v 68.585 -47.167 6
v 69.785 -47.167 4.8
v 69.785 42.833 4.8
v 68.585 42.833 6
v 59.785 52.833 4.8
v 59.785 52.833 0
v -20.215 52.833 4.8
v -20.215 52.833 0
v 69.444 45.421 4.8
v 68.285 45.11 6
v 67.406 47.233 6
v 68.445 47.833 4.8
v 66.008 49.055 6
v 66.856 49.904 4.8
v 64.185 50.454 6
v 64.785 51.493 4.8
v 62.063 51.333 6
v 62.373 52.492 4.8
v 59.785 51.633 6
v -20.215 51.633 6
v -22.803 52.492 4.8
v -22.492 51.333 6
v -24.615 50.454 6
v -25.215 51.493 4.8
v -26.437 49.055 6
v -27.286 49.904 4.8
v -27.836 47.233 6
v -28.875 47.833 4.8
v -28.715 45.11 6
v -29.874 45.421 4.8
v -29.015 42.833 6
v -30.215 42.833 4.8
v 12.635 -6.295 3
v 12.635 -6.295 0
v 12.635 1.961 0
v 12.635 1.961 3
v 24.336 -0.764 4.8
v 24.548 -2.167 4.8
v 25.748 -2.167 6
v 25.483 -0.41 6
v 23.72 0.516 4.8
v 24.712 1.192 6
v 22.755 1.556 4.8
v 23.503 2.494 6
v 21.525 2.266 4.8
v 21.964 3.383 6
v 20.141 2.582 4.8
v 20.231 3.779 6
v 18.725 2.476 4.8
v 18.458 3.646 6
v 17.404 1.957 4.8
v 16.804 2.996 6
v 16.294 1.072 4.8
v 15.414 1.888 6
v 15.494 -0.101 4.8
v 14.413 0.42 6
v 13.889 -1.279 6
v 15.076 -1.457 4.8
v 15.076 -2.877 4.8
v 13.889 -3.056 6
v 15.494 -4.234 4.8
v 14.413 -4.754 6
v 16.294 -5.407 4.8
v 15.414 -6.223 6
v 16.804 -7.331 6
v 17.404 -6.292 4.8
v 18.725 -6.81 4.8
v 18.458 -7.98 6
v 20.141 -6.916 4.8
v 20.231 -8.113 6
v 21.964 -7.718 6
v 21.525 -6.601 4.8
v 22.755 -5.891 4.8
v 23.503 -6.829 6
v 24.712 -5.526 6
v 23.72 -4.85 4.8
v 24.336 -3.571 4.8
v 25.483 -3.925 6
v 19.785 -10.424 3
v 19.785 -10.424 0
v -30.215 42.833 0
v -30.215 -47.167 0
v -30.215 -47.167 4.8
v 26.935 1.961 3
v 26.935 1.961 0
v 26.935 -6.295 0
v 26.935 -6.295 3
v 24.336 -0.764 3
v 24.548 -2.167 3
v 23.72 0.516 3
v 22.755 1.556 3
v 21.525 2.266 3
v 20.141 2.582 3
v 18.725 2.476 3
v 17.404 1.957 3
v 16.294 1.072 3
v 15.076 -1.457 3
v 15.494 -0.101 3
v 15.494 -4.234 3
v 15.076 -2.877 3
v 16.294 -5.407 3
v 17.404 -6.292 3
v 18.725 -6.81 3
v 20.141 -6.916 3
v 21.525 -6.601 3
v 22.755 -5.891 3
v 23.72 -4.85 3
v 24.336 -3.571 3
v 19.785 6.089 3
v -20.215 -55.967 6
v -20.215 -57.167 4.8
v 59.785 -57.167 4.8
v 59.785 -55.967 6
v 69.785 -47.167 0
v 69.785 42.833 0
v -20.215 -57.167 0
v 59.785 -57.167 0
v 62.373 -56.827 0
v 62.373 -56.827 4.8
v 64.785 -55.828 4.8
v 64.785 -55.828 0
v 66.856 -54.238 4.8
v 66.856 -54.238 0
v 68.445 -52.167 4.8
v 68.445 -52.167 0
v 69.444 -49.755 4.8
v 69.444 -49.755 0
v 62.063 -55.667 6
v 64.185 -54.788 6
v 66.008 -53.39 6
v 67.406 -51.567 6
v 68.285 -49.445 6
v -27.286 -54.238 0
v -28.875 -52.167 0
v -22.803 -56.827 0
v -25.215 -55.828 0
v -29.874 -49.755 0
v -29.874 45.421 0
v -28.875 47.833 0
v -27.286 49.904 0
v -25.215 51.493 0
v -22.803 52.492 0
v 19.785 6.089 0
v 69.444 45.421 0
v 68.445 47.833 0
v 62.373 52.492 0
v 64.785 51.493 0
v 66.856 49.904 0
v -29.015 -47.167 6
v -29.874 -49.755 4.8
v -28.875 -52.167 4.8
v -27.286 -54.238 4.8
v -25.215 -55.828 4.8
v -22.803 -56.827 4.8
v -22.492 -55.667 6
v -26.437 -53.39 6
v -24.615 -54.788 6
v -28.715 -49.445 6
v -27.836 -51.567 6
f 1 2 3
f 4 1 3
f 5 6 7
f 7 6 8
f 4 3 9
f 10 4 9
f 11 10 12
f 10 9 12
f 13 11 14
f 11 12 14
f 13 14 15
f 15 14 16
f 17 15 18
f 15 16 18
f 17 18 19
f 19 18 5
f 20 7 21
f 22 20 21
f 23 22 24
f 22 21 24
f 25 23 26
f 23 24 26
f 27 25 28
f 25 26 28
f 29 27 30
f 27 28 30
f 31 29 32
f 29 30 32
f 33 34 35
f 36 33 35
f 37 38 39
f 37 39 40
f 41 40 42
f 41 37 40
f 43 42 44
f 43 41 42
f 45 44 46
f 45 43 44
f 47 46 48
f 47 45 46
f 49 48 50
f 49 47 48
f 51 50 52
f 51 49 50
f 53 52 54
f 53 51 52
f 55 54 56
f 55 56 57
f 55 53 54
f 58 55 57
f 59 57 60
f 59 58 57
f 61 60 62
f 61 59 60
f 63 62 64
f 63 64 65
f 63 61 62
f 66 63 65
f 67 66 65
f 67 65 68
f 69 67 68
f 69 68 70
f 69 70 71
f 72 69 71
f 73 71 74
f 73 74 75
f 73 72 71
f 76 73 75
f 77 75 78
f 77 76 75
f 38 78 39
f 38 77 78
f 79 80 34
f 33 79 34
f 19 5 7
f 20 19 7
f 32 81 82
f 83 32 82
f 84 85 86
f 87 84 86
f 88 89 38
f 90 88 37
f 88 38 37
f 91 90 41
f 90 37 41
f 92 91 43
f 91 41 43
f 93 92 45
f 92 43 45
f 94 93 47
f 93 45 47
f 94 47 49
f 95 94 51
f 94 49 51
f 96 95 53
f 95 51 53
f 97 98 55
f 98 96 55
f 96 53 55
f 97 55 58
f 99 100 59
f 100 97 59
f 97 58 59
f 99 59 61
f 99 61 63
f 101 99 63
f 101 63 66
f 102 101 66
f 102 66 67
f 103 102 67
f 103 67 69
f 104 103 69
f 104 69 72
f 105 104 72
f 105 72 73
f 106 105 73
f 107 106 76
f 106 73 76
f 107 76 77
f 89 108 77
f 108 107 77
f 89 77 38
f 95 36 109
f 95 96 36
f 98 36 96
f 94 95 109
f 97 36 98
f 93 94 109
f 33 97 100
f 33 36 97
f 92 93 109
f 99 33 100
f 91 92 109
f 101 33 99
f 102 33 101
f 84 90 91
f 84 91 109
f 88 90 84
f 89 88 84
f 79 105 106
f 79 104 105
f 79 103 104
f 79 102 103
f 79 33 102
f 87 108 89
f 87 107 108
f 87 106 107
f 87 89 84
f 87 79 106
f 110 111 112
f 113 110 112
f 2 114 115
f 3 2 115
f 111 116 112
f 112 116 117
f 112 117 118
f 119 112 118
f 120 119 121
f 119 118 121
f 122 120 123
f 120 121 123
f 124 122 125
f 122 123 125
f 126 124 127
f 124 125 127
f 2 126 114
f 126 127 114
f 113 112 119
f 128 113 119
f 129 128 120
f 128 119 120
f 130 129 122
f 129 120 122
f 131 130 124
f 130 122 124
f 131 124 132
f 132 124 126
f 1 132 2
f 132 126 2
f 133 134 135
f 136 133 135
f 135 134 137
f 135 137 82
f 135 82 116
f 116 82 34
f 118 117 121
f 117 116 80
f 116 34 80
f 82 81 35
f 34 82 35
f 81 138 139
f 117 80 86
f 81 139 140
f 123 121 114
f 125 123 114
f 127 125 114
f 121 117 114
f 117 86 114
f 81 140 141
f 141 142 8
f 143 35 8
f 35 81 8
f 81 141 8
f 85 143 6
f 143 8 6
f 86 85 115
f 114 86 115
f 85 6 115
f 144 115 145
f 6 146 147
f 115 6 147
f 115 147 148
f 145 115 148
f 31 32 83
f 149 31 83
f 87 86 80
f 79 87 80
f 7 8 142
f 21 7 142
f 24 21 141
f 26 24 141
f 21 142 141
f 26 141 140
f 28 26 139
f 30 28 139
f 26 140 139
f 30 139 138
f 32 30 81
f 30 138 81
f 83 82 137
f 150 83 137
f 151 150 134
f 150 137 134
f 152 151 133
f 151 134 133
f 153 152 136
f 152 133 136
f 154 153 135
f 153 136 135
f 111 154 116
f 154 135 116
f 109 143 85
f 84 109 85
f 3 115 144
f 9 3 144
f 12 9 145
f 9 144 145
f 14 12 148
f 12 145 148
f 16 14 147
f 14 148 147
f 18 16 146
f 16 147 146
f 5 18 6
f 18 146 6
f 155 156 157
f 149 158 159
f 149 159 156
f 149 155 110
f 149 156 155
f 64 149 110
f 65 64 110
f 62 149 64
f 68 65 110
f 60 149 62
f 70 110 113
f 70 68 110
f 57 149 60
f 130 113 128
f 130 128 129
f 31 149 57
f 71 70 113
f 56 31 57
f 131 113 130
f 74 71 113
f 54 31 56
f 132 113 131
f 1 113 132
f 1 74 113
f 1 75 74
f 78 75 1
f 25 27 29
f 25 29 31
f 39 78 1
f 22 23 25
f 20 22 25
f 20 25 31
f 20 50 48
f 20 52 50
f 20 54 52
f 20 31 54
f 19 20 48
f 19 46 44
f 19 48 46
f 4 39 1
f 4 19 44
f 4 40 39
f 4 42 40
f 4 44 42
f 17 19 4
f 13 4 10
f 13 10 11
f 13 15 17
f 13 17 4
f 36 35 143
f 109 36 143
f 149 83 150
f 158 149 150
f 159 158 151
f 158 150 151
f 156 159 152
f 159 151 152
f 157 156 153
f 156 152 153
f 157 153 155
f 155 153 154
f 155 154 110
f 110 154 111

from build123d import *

# Parameters (mm, degrees)
F1_DEPTH = 6
F2_R     = 4.7625
F3_DEPTH = 25
F4_R     = 4.7625
F5_DEPTH = 3
F6_SIZE  = 1.2


with BuildPart() as f1:
    # F0 (on Top) → F1 (new body)
    with BuildSketch(Plane.XY):
        with BuildLine():
            ThreePointArc((-30.2148338807, -47.1672770381), (-27.2859016925, -54.23834485), (-20.2148338807, -57.1672770381))
            Line((-20.2148338807, -57.1672770381), (59.7851661193, -57.1672770381))
            ThreePointArc((59.7851661193, -57.1672770381), (66.8562339312, -54.23834485), (69.7851661193, -47.1672770381))
            Line((69.7851661193, -47.1672770381), (69.7851661193, 42.8327229619))
            ThreePointArc((69.7851661193, 42.8327229619), (66.8562339312, 49.9037907738), (59.7851661193, 52.8327229619))
            Line((59.7851661193, 52.8327229619), (-20.2148338807, 52.8327229619))
            ThreePointArc((-20.2148338807, 52.8327229619), (-27.2859016925, 49.9037907738), (-30.2148338807, 42.8327229619))
            Line((-30.2148338807, 42.8327229619), (-30.2148338807, -47.1672770381))
        make_face()
    extrude(amount=F1_DEPTH)

    # F2 (on face) → F3 (cut)
    with BuildSketch(Plane.XY.offset(6)):
        with Locations((19.7851661193, -2.1672770381)):
            Circle(F2_R)
    extrude(amount=-F3_DEPTH, mode=Mode.SUBTRACT)

    # F4 (on face) → F5 (cut)
    with BuildSketch(Plane(origin=(0, 0, 0), x_dir=(1, 0, 0), z_dir=(0, 0, -1))):
        Polygon((26.9352661193, -1.9608351216), (26.9352661193, 6.2953891978), (19.7851661193, 10.4235013576), (12.6350661193, 6.2953891978), (12.6350661193, -1.9608351216), (19.7851661193, -6.0889472814), align=None)
        with Locations((19.7851661193, 2.1672770381)):
            Circle(F4_R, mode=Mode.SUBTRACT)
    extrude(amount=-F5_DEPTH, mode=Mode.SUBTRACT)

    # F6
    f6_edges = [f1.edges().sort_by_distance(p)[0] for p in [
        (-27.285902, 49.903791, 6),
        (19.785166, 52.832723, 6),
        (-30.214834, -2.167277, 6),
        (66.856234, 49.903791, 6),
        (-27.285902, -54.238345, 6),
        (69.785166, -2.167277, 6),
        (19.785166, -57.167277, 6),
        (66.856234, -54.238345, 6),
        (15.022666, -2.167277, 6),
    ]]
    chamfer(f6_edges, length=F6_SIZE)


solid = f1.part
